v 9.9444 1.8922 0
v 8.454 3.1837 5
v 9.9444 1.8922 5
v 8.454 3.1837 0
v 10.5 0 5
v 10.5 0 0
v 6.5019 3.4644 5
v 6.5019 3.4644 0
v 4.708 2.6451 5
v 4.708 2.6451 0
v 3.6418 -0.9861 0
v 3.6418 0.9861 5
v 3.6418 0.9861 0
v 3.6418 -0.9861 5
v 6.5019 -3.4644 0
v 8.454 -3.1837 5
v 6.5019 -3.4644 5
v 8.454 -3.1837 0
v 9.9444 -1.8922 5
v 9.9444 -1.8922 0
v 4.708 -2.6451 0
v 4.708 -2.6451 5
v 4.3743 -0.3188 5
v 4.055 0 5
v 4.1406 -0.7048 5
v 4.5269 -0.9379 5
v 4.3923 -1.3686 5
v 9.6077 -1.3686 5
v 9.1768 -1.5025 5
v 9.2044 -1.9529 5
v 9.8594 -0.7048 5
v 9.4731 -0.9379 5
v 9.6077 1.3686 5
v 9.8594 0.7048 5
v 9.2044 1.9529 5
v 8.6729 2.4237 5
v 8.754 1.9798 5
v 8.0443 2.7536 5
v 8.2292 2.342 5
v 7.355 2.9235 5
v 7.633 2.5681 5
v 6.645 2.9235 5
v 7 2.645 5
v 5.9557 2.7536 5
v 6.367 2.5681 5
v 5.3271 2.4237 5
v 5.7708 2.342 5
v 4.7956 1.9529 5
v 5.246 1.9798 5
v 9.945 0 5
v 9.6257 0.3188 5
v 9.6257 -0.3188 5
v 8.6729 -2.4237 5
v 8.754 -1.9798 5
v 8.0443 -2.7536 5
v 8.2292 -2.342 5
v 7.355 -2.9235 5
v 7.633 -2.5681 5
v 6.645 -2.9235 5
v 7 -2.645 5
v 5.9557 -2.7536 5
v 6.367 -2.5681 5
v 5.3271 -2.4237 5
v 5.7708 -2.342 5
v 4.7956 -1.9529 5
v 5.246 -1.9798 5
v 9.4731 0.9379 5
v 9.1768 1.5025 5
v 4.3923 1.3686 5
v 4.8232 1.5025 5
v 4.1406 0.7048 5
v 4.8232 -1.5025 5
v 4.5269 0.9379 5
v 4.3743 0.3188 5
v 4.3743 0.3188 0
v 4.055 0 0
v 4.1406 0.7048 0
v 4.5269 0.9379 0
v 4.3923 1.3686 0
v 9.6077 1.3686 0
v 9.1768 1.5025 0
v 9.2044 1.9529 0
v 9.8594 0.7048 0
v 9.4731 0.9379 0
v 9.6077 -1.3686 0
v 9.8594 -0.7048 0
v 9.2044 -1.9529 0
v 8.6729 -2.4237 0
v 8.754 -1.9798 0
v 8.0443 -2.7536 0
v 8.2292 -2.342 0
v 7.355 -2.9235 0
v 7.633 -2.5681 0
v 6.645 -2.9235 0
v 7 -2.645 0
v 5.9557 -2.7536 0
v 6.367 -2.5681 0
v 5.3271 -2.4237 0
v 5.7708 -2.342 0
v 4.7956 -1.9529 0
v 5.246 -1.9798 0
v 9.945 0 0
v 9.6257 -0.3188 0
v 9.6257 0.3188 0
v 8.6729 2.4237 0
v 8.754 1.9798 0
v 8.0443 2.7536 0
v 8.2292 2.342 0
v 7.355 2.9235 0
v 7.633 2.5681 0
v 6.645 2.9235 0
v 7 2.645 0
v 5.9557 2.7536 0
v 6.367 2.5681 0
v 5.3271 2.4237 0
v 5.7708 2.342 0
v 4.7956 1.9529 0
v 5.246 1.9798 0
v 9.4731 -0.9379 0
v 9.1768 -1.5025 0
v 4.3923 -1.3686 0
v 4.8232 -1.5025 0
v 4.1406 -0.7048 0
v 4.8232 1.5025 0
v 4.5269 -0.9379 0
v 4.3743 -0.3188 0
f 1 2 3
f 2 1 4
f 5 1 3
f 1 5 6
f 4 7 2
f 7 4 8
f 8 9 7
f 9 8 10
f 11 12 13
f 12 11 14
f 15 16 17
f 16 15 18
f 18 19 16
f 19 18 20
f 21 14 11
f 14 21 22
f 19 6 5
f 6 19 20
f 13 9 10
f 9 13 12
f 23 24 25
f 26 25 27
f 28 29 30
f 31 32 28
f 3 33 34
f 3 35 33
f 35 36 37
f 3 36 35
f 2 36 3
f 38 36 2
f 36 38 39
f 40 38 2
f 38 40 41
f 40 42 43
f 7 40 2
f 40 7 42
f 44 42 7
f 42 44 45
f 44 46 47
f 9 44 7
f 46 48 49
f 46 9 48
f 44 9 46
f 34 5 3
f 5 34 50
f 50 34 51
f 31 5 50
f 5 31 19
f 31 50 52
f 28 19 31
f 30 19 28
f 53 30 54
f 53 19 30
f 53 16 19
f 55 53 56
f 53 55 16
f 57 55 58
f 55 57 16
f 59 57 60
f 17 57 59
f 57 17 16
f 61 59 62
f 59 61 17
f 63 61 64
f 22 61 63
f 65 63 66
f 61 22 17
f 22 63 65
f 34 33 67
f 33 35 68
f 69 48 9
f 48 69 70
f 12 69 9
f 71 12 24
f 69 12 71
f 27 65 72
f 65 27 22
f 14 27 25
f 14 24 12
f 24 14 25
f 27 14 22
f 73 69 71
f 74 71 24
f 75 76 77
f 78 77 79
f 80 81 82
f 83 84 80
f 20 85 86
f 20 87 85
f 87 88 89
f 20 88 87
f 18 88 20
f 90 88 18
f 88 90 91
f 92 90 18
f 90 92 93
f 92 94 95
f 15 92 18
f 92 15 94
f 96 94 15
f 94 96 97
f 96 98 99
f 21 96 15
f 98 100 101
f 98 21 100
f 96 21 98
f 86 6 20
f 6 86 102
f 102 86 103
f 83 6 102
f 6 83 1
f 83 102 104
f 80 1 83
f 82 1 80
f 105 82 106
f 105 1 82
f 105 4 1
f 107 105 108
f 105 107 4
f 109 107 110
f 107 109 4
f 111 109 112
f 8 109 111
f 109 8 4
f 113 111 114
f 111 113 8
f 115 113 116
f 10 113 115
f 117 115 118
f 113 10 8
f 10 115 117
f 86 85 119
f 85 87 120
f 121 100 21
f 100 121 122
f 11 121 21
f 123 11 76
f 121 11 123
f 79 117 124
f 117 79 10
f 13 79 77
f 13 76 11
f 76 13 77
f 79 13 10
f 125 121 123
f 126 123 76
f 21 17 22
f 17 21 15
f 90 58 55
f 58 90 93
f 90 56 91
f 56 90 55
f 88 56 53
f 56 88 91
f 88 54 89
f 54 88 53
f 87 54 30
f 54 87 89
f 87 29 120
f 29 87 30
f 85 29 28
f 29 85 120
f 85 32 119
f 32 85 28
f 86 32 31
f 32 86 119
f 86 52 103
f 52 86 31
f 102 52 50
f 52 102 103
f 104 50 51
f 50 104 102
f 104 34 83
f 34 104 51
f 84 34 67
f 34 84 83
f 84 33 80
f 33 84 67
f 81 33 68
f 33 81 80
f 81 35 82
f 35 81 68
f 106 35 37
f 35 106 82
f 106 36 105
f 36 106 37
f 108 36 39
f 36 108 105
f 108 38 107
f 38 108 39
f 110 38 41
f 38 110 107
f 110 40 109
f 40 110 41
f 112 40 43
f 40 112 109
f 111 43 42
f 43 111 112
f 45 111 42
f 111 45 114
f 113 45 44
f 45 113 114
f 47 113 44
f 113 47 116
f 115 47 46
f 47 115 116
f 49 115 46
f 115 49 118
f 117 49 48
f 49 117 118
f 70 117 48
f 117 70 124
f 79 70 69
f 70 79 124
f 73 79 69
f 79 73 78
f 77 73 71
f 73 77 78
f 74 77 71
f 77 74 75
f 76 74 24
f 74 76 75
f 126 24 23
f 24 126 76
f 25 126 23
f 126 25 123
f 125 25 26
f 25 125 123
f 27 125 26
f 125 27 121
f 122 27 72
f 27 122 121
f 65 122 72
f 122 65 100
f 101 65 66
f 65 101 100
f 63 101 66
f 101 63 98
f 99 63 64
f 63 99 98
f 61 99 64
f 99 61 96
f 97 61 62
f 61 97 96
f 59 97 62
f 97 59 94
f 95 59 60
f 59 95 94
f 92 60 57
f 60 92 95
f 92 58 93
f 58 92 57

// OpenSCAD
// The goal of this module is to create a hollow cylinder with a number of triangular teeth on the inside.
function get_circle_coordinates(angle, radius) = [radius * cos(angle), radius * sin(angle)];

module triangular_teeth(inner_diameter, tooth_length, number_of_teeth, height){
    linear_extrude(height=height){
        polygon(points = [for (index = [0 : 2*number_of_teeth]) get_circle_coordinates(
            // This splits each point into its angle from 0.
            angle = (360*index)/(2*number_of_teeth),
            // This sets the radius of the point on the circle, with even points being outside vertices
            // and odd points being the sharp, pointy part of the tooth.
            radius = index % 2 == 0 ? inner_diameter/2 + tooth_length : inner_diameter/2)]);
    }
}

module triangular_tooth_cylinder(outer_diameter, inner_diameter, tooth_length, number_of_teeth, height){
    assert(number_of_teeth > 2, "This module doesn't make any sense with fewer than 3 teeth");
    assert(outer_diameter > inner_diameter, "This module doesn't make any sense with a larger inner diameter than the outer diameter");
    assert(tooth_length < inner_diameter/2, "The teeth can't be longer than the inner radius, or it'll just be a filled-in cylinder");

    difference(){
        cylinder(h = height, r = outer_diameter/2);
        triangular_teeth(inner_diameter = inner_diameter, tooth_length = tooth_length, number_of_teeth = number_of_teeth, height = height);
    }
}


translate([7, 0, 0]) triangular_tooth_cylinder(outer_diameter = 7, inner_diameter = 5.89-.6, tooth_length = .3, number_of_teeth = 26, height = 5);
